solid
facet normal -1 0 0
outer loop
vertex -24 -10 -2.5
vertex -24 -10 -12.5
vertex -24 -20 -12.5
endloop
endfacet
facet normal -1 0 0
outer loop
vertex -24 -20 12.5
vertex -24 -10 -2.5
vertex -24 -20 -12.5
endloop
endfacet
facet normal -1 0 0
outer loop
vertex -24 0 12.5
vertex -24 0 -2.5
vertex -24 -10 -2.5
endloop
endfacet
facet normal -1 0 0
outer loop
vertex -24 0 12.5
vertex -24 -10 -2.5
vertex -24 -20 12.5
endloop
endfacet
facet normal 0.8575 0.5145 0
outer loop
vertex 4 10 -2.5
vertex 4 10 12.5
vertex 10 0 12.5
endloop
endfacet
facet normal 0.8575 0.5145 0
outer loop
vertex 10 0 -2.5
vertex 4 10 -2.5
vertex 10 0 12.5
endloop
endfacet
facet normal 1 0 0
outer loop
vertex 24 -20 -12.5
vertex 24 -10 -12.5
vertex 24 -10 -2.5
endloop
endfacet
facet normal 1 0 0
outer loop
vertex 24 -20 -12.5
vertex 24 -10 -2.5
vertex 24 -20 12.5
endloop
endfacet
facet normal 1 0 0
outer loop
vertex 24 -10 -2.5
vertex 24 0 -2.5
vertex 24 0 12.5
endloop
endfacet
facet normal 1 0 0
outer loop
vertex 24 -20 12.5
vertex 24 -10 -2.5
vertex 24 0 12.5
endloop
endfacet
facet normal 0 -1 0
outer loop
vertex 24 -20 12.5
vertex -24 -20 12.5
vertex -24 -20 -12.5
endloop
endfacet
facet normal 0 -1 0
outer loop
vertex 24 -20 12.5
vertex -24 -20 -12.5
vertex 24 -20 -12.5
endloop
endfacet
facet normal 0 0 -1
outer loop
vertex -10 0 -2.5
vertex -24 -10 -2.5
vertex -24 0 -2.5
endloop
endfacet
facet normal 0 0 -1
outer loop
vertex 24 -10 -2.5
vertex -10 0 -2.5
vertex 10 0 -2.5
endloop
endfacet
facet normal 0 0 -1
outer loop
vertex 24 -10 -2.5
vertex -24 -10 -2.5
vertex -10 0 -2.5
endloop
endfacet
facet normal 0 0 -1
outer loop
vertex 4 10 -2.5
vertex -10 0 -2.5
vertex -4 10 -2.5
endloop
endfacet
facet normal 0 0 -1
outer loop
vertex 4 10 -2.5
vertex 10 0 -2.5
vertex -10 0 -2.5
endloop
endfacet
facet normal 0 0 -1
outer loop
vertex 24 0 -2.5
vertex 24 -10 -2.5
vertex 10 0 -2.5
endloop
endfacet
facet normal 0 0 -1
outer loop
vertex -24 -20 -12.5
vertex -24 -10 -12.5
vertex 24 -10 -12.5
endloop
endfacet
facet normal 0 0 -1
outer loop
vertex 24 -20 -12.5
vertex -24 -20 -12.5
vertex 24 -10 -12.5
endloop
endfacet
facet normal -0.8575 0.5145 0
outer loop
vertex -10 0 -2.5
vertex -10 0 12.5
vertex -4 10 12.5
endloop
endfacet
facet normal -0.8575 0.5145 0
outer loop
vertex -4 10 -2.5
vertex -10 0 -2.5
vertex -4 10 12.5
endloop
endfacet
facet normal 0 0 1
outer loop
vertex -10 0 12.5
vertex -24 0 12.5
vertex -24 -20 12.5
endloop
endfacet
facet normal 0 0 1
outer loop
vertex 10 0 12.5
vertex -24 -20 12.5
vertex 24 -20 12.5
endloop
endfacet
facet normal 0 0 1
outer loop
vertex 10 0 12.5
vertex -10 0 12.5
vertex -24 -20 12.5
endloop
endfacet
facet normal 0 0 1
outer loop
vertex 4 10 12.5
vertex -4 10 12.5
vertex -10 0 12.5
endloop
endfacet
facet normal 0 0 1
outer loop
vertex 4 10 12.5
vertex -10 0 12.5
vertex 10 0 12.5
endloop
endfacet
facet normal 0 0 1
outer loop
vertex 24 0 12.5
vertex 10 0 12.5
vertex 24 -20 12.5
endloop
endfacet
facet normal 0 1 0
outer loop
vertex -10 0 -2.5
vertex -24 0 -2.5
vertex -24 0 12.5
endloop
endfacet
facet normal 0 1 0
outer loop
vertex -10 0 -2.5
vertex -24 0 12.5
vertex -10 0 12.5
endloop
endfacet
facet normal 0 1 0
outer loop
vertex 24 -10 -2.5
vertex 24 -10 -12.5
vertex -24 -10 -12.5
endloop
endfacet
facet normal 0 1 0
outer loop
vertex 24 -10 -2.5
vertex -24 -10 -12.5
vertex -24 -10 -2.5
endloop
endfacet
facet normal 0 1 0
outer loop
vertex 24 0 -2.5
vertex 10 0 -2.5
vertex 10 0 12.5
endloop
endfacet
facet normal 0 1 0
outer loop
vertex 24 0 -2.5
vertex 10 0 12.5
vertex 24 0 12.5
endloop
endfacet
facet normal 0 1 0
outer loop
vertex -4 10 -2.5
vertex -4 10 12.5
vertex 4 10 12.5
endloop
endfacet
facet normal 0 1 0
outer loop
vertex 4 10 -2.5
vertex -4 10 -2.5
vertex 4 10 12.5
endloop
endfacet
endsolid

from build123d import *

# Parameters (mm, degrees)
F0_W     = 48
F0_H     = 25
F1_DEPTH = 10
F3_DEPTH = 15
F4_DEPTH = 20
F5_W     = 20
F5_H     = 10
F6_DEPTH = 48


with BuildPart() as f1:
    # F0 (on Front) → F1 (new body)
    with BuildSketch(Plane.XZ):
        Rectangle(F0_W, F0_H)
    extrude(amount=-F1_DEPTH)

    # F2 (on face) → F3 (cut)
    with BuildSketch(Plane.XY.offset(12.5)):
        Polygon((-24, 0), (-10, 0), (-4, 10), (-24, 10), align=None)
        Polygon((4, 10), (10, 0), (24, 0), (24, 10), align=None)
    extrude(amount=-F3_DEPTH, mode=Mode.SUBTRACT)

    # F0 (on Front) → F4 (join)
    with BuildSketch(Plane.XZ):
        Rectangle(F0_W, F0_H)
    extrude(amount=F4_DEPTH)

    # F5 (on face) → F6 (cut)
    with BuildSketch(Plane.YZ.offset(24)):
        with Locations((0, -7.5)):
            Rectangle(F5_W, F5_H)
    extrude(amount=-F6_DEPTH, mode=Mode.SUBTRACT)


solid = f1.part
